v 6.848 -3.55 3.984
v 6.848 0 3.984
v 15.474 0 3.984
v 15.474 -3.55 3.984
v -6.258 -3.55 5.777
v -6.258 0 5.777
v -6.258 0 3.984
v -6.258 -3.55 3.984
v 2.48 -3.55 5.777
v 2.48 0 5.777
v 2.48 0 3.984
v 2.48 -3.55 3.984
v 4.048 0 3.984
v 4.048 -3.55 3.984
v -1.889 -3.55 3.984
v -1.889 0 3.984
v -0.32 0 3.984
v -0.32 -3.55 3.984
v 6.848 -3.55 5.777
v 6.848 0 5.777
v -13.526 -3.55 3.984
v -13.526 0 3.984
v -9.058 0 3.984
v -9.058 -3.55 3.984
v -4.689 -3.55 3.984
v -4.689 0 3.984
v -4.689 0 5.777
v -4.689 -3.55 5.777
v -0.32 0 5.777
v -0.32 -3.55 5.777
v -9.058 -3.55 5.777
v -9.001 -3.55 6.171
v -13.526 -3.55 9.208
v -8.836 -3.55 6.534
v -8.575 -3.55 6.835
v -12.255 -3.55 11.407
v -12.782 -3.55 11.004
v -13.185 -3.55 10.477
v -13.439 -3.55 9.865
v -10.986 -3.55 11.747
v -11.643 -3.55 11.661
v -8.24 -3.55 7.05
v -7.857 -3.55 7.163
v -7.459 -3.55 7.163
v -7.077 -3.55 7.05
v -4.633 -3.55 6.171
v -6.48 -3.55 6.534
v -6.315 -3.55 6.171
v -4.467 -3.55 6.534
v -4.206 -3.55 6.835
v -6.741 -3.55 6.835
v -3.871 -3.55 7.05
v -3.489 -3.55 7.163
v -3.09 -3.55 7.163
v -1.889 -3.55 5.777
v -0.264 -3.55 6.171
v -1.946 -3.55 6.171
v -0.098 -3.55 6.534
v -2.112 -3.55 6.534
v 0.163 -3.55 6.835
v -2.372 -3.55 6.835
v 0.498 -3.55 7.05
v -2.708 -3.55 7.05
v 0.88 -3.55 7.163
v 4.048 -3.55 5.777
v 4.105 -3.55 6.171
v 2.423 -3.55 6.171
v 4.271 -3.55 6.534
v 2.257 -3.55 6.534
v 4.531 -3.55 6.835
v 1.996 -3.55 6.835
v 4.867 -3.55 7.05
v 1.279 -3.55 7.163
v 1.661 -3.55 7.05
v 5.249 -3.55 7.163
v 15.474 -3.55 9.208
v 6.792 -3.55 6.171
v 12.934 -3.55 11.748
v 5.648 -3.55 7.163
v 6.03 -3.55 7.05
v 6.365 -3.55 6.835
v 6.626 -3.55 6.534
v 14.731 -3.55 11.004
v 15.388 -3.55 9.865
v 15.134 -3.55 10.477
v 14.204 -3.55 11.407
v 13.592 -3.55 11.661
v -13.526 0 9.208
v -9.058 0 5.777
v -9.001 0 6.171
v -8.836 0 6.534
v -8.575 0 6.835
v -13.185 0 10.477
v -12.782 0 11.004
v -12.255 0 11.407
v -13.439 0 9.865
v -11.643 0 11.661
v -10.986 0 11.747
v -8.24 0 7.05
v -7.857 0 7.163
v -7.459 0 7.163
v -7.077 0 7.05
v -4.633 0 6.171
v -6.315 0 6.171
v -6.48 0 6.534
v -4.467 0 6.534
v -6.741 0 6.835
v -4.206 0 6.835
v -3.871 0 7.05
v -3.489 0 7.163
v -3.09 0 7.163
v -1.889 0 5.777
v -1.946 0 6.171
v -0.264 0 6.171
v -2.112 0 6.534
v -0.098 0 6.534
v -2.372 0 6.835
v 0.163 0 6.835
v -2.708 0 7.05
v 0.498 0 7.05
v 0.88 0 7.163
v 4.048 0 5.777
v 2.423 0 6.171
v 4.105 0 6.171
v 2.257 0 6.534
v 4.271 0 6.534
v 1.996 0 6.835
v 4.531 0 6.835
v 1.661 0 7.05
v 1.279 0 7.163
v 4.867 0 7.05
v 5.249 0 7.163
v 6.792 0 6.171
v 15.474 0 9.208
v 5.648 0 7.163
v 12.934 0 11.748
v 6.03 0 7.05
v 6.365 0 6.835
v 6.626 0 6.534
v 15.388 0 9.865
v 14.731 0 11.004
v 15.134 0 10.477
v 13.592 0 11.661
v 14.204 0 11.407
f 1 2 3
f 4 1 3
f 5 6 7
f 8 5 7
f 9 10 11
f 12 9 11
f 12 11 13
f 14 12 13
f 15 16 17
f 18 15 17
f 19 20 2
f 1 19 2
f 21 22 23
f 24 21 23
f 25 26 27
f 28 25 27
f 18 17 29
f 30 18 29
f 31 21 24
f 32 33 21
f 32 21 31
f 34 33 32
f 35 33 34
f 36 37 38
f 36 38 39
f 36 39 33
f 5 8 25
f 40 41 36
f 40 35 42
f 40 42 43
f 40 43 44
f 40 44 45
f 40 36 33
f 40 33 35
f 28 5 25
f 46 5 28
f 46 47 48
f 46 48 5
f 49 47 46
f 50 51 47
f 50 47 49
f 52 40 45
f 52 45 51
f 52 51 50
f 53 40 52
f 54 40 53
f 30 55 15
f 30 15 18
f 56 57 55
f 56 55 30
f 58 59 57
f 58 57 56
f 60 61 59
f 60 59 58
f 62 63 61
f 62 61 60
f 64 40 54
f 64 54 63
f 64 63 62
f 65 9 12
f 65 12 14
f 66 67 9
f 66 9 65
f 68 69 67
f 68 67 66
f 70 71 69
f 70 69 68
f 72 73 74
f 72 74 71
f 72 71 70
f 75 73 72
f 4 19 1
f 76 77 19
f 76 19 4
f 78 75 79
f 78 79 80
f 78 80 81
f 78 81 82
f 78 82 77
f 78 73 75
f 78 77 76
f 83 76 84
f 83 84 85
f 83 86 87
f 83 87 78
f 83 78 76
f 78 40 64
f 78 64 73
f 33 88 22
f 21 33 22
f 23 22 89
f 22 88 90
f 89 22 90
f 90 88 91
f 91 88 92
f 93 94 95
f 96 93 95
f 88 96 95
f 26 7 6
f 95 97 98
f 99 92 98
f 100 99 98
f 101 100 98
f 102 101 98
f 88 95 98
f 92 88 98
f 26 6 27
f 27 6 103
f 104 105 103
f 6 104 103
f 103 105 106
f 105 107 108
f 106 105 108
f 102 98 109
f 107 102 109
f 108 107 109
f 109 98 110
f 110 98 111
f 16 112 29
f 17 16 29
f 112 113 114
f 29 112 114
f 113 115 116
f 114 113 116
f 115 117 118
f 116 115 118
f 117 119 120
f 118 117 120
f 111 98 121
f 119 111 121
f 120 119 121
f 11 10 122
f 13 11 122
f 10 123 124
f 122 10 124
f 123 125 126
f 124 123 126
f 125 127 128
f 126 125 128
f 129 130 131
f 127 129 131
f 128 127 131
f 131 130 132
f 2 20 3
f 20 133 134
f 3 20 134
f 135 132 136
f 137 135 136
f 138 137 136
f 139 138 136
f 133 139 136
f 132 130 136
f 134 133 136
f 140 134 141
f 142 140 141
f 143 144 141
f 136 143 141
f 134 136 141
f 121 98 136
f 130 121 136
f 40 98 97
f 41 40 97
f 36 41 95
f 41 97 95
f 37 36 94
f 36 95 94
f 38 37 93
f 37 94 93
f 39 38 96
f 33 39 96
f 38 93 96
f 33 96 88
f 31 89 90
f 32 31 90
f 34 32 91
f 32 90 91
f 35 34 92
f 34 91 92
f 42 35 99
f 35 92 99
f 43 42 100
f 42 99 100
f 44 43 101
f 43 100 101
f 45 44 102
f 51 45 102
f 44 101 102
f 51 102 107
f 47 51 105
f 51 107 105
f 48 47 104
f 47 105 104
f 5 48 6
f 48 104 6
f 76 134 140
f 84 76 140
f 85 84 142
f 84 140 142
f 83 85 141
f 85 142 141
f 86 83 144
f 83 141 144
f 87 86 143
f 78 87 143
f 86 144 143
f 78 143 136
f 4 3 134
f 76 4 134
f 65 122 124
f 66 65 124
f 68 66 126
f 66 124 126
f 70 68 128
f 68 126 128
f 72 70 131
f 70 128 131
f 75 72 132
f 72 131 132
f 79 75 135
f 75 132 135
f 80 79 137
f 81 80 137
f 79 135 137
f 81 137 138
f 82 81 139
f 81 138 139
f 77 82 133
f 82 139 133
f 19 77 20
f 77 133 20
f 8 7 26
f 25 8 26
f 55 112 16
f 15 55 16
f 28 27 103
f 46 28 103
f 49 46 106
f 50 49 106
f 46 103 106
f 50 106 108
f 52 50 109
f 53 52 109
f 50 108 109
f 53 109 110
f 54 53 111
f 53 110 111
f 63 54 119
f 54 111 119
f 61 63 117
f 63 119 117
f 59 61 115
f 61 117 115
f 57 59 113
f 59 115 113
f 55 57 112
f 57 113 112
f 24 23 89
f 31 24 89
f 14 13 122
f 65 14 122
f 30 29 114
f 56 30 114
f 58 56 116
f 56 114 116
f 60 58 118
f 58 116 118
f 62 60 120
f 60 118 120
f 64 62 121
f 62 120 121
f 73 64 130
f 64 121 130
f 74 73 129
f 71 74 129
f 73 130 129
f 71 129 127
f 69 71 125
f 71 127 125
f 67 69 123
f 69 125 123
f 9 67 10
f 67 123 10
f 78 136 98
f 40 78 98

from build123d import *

# Parameters (mm, degrees)
F1_DEPTH = 3.55


with BuildPart() as f1:
    # F0 (on Front) → F1 (new body)
    with BuildSketch(Plane.XZ):
        with BuildLine():
            Line((12.9345, 11.7475), (-10.9855, 11.7475))
            ThreePointArc((-10.9855, 11.7475), (-12.781551, 11.003551), (-13.5255, 9.2075))
            Line((-13.5255, 9.2075), (-13.5255, 3.9844))
            Line((-13.5255, 3.9844), (-9.0581, 3.9844))
            Line((-9.0581, 3.9844), (-9.0581, 5.7769))
            ThreePointArc((-9.0581, 5.7769), (-7.6581, 7.1769), (-6.2581, 5.7769))
            Line((-6.2581, 5.7769), (-6.2581, 3.9844))
            Line((-6.2581, 3.9844), (-4.6893, 3.9844))
            Line((-4.6893, 3.9844), (-4.6893, 5.7769))
            ThreePointArc((-4.6893, 5.7769), (-3.2893, 7.1769), (-1.8893, 5.7769))
            Line((-1.8893, 5.7769), (-1.8893, 3.9844))
            Line((-1.8893, 3.9844), (-0.3205, 3.9844))
            Line((-0.3205, 3.9844), (-0.3205, 5.7769))
            ThreePointArc((-0.3205, 5.7769), (1.0795, 7.1769), (2.4795, 5.7769))
            Line((2.4795, 5.7769), (2.4795, 3.9844))
            Line((2.4795, 3.9844), (4.0483, 3.9844))
            Line((4.0483, 3.9844), (4.0483, 5.7769))
            ThreePointArc((4.0483, 5.7769), (5.4483, 7.1769), (6.8483, 5.7769))
            Line((6.8483, 5.7769), (6.8483, 3.9844))
            Line((6.8483, 3.9844), (15.4745, 3.9844))
            Line((15.4745, 3.9844), (15.4745, 9.2075))
            ThreePointArc((15.4745, 9.2075), (14.730551, 11.003551), (12.9345, 11.7475))
        make_face()
    extrude(amount=F1_DEPTH)


solid = f1.part
